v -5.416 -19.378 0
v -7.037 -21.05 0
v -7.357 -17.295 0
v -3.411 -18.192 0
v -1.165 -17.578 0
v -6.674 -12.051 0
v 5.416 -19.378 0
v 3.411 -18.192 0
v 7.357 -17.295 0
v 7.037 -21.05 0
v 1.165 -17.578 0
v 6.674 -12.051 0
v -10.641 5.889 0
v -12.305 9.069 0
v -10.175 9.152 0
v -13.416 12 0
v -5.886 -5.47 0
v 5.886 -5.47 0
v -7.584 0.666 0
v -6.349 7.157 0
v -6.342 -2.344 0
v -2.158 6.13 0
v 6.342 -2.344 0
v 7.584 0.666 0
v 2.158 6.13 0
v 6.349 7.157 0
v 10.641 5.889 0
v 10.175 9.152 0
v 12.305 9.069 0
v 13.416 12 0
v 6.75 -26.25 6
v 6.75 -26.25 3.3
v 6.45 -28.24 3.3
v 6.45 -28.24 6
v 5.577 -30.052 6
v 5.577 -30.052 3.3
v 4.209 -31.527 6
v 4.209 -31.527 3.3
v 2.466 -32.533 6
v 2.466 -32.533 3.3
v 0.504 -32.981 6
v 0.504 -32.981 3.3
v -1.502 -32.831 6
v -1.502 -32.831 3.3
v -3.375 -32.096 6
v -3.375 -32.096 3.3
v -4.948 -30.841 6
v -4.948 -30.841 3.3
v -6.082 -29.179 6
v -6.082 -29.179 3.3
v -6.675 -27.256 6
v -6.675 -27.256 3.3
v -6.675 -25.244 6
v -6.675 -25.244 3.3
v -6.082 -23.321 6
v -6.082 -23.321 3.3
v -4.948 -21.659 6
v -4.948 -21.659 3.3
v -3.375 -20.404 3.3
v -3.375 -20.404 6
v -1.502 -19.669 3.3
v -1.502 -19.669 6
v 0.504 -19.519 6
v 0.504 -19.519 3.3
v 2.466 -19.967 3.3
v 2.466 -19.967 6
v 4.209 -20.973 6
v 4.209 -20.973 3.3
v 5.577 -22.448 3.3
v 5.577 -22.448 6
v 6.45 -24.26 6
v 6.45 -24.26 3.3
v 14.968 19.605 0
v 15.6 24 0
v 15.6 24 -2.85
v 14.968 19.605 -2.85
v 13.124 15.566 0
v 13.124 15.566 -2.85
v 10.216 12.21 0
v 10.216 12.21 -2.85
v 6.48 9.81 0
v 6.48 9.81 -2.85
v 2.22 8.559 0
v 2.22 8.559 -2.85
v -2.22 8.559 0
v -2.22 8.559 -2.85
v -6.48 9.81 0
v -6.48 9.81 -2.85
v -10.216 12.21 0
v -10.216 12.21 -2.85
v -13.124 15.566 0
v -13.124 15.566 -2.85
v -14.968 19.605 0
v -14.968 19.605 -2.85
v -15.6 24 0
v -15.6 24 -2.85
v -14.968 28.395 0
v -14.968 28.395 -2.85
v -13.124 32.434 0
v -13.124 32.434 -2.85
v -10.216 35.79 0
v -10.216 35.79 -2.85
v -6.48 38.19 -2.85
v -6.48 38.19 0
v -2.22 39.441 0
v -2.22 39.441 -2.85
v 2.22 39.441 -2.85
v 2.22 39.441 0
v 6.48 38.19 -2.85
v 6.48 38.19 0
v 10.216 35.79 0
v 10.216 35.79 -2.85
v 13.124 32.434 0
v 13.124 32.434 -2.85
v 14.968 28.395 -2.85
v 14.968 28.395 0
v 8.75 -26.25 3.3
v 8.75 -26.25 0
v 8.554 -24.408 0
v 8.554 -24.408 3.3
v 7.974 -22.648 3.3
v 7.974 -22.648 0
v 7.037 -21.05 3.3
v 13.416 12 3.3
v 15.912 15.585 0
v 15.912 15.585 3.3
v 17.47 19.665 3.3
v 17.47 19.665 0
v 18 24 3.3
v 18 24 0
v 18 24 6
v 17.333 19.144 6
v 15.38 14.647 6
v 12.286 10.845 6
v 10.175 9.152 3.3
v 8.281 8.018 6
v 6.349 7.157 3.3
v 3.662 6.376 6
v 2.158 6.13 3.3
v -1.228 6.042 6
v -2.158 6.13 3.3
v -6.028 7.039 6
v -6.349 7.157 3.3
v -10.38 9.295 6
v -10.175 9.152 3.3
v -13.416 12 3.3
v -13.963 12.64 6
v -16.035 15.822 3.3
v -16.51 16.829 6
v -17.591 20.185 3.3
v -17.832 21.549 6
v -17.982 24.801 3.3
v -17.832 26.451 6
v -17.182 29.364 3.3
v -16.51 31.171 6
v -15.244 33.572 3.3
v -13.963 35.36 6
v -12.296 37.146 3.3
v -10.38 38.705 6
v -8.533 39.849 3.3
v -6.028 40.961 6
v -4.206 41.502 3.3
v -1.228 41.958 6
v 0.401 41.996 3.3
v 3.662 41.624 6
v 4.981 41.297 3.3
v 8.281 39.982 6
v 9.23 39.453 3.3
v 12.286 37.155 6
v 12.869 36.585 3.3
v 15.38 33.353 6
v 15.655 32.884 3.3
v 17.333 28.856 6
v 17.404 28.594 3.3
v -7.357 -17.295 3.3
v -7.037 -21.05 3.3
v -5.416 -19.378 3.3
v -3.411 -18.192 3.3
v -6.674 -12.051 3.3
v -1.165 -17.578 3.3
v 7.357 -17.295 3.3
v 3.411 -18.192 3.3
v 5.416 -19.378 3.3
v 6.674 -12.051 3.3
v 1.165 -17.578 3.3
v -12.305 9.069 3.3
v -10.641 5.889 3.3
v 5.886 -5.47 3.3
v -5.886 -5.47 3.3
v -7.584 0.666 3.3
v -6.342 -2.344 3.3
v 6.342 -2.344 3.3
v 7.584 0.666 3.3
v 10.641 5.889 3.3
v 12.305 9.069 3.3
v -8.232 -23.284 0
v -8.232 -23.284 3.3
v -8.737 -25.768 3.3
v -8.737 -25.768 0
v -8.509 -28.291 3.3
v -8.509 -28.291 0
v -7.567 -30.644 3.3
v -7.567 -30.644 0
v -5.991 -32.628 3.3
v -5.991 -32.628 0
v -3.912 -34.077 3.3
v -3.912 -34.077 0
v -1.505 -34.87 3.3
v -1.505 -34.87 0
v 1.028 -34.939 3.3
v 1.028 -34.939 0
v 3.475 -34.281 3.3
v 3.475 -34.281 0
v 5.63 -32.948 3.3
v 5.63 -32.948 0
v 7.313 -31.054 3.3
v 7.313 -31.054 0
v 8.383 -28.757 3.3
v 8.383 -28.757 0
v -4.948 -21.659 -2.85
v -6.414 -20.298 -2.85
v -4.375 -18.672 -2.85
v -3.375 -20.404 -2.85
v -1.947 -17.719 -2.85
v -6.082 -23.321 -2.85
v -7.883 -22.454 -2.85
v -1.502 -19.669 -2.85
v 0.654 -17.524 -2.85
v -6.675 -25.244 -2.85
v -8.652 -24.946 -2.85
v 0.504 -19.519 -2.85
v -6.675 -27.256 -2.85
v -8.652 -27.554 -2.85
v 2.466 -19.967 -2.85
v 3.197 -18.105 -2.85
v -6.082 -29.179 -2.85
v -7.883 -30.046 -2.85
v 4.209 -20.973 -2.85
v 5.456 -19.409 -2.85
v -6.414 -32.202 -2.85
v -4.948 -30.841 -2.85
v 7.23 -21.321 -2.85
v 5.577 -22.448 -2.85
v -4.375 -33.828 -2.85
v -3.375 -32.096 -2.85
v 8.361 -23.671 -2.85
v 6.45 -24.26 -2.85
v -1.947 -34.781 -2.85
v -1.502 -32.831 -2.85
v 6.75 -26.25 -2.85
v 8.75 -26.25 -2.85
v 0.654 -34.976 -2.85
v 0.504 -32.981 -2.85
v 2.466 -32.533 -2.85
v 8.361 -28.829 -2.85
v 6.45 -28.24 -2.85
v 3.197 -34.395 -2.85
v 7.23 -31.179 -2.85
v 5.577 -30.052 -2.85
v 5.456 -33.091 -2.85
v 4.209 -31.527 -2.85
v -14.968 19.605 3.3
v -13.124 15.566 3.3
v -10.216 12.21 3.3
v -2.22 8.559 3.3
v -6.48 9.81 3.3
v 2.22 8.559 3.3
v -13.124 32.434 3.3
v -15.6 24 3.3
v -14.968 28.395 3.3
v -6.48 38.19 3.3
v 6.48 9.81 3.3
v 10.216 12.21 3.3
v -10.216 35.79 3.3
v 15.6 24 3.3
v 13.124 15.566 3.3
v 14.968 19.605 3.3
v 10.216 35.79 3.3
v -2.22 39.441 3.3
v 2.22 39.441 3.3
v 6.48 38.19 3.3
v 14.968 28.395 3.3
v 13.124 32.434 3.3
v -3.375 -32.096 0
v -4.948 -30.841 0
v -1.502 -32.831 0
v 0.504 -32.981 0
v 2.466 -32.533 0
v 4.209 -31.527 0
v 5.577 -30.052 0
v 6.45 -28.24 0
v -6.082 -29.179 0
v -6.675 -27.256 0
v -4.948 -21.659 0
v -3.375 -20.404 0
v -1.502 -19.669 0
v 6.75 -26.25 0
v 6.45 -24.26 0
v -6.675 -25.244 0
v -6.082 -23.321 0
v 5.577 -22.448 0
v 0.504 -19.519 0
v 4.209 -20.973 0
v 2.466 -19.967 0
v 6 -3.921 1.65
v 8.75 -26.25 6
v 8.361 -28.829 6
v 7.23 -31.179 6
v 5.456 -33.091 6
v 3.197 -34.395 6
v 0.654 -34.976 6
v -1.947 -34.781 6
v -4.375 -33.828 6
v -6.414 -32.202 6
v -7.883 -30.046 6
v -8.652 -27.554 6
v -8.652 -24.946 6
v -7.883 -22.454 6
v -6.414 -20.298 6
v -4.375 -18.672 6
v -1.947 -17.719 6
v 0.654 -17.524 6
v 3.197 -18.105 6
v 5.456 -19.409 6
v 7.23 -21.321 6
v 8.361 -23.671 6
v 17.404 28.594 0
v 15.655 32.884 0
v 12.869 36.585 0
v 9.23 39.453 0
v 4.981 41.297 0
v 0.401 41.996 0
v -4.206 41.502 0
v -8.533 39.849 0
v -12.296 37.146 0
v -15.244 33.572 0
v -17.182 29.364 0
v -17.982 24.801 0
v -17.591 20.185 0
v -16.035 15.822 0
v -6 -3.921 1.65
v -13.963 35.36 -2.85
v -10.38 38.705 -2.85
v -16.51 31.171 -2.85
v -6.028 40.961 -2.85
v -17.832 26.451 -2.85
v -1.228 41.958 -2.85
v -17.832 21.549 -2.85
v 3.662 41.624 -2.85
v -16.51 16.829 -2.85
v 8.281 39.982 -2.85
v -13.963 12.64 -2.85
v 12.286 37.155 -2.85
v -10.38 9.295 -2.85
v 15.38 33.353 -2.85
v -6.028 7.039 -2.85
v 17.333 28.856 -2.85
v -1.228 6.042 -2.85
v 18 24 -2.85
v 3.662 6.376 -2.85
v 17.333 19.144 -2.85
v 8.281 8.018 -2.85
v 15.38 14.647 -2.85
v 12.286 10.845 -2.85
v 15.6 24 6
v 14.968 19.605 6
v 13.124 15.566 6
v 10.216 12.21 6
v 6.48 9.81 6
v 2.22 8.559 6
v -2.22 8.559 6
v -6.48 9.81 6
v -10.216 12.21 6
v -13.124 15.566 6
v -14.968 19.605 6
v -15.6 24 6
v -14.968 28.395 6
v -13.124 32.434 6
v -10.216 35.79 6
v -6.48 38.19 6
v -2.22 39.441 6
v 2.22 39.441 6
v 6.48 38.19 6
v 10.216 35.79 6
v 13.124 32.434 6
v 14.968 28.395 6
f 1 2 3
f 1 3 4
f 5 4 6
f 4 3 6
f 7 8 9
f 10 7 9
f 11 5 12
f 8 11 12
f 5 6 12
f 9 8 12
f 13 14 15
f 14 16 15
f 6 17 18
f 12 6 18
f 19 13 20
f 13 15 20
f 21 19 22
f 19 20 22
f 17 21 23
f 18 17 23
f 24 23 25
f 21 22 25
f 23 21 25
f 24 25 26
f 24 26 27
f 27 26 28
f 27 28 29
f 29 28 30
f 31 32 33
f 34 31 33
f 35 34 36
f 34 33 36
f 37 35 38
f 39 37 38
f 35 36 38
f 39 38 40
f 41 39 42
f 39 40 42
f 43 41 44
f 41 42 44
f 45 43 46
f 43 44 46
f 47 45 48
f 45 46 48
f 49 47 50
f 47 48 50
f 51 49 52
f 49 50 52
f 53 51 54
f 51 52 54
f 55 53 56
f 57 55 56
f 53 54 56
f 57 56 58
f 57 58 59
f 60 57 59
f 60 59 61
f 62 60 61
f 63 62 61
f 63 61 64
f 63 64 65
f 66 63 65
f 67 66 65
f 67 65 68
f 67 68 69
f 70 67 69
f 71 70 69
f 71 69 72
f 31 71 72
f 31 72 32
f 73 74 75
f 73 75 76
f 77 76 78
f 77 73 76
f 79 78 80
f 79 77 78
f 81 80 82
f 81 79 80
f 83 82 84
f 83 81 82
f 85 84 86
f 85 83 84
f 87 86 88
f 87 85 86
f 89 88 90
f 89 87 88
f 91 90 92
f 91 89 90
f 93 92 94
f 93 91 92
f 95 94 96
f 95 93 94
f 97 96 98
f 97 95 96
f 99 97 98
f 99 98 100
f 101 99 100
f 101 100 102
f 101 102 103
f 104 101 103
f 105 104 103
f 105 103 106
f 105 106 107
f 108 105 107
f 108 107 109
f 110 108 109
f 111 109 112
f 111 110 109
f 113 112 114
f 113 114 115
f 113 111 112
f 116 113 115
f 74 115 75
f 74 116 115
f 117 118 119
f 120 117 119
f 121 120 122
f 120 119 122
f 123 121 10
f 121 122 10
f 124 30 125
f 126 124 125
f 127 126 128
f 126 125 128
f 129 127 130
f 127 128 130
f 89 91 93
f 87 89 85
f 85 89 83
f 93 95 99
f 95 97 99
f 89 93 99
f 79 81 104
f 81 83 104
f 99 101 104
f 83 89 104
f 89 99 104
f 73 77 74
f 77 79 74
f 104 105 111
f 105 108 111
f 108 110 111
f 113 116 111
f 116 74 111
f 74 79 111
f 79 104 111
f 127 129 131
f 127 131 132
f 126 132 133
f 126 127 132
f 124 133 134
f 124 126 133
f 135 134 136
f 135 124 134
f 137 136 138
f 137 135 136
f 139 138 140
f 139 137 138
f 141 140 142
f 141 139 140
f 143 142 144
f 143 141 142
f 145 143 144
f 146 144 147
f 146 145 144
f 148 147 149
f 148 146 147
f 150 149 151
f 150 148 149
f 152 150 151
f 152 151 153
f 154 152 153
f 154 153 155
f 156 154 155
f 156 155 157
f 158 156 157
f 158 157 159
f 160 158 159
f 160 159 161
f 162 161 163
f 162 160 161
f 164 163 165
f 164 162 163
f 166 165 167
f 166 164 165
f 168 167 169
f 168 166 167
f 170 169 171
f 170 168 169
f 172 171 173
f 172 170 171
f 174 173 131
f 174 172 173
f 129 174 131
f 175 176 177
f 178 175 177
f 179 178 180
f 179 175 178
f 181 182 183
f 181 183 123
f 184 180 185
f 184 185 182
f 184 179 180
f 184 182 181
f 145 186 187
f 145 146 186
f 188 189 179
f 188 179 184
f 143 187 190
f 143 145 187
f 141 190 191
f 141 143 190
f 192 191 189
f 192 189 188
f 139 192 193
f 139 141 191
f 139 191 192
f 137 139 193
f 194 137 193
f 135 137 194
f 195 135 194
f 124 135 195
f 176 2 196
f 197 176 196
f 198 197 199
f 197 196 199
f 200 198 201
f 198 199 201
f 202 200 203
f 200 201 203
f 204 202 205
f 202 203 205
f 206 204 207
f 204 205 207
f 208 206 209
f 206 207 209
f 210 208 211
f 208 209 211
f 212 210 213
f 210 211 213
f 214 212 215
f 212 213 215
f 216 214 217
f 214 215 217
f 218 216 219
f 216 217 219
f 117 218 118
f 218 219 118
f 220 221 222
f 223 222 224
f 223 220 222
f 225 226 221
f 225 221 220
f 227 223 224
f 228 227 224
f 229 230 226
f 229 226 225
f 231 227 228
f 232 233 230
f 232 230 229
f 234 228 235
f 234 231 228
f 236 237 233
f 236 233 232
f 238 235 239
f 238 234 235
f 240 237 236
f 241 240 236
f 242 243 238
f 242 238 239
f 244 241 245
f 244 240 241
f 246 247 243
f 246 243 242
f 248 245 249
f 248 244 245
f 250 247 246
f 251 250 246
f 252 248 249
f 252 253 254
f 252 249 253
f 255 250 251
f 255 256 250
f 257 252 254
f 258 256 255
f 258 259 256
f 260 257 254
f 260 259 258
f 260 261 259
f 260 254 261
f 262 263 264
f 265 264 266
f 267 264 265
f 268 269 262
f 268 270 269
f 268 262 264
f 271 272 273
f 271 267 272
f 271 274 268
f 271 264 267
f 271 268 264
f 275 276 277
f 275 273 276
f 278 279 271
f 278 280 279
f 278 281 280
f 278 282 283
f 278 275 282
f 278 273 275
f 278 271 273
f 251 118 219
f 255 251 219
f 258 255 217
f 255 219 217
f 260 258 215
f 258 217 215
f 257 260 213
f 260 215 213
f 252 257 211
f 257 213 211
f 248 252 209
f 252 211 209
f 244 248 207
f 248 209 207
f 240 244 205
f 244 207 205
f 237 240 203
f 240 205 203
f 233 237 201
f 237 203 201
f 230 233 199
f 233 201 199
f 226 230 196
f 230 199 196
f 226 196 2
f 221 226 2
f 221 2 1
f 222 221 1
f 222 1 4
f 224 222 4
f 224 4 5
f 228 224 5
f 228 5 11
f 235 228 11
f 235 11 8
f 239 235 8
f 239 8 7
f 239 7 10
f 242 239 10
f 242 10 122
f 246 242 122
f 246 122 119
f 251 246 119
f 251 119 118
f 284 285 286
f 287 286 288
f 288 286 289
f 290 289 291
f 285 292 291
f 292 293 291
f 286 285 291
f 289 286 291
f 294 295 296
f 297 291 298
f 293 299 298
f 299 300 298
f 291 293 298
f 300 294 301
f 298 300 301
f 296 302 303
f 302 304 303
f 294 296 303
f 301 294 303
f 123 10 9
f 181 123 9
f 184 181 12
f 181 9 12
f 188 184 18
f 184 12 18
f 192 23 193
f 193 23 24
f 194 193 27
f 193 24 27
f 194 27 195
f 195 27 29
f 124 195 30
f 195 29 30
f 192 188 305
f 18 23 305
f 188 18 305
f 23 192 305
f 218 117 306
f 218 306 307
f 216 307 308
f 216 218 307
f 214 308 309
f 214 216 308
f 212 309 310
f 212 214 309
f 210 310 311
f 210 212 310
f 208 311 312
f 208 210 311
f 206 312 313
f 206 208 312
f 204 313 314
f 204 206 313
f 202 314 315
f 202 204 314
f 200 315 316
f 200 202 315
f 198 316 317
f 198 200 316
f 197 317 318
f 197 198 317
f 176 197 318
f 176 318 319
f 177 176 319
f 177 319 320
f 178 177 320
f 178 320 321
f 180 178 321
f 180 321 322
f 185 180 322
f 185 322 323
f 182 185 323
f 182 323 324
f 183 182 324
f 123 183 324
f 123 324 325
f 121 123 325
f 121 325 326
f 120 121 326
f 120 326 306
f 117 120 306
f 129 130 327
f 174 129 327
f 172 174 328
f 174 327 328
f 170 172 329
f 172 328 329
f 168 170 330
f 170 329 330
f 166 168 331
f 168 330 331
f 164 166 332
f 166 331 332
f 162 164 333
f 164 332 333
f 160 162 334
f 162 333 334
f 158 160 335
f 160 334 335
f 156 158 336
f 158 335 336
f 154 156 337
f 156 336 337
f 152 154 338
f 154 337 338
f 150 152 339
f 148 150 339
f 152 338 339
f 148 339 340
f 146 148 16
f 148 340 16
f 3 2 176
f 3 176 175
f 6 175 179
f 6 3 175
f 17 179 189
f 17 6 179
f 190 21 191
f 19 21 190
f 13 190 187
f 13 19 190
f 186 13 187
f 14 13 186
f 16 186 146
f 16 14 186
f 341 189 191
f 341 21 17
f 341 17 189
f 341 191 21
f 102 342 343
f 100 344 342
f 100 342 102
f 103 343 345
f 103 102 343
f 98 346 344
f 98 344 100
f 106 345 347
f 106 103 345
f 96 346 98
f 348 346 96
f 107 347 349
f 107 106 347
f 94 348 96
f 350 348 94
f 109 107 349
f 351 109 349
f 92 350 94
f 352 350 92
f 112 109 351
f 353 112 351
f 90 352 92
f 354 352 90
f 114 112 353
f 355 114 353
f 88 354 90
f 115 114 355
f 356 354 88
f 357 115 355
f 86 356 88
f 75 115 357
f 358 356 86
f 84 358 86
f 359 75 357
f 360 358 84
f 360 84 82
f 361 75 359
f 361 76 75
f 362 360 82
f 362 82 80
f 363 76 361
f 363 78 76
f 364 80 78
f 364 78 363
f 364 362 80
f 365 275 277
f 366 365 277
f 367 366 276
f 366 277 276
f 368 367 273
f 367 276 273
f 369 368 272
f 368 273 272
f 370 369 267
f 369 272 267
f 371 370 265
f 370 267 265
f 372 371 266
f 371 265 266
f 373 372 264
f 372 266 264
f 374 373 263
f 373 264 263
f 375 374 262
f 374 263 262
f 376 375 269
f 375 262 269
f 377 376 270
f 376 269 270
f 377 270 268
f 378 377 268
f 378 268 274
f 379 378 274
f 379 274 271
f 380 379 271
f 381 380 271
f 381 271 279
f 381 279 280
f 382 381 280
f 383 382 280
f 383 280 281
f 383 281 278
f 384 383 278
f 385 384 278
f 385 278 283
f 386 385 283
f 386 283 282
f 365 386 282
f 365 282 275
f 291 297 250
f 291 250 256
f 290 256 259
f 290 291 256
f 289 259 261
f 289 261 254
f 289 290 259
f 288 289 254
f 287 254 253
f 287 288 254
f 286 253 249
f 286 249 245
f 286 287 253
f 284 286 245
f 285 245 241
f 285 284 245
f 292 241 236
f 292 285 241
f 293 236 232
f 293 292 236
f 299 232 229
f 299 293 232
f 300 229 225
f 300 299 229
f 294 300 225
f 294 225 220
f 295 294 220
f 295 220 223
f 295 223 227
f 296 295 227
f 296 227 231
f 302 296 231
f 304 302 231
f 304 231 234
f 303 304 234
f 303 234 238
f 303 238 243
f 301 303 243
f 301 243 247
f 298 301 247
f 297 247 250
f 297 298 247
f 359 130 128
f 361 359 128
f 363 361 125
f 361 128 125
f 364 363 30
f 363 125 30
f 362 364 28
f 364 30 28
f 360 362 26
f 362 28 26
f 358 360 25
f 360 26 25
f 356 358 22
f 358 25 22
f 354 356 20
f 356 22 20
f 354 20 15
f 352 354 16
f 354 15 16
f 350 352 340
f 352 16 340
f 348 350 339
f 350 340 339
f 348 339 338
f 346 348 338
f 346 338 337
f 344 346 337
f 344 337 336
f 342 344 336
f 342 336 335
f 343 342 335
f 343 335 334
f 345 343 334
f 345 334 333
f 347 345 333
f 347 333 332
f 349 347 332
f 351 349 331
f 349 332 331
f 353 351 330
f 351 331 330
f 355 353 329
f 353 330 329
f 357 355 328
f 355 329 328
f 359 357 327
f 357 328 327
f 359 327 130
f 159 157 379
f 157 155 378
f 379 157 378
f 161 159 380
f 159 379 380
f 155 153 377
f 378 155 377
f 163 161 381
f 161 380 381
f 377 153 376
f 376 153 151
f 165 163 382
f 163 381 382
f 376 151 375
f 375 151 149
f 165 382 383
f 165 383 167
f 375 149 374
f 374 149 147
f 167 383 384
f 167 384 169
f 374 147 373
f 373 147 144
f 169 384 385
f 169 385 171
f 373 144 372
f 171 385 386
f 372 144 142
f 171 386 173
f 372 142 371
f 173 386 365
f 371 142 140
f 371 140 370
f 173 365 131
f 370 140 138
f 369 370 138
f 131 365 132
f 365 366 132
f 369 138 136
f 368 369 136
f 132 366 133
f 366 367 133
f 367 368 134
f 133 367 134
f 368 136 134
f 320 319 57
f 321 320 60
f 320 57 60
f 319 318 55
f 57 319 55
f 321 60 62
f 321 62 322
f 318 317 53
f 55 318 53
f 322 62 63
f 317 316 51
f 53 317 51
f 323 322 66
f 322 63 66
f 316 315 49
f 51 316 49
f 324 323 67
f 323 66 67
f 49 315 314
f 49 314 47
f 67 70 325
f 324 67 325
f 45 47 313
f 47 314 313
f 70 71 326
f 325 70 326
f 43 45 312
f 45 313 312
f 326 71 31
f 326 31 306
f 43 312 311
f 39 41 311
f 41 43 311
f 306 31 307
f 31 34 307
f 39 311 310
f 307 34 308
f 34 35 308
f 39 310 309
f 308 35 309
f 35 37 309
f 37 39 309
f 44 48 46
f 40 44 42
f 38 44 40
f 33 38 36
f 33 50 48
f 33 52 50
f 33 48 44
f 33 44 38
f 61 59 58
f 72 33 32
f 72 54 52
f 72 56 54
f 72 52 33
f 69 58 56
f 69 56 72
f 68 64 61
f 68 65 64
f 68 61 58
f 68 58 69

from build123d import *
from build123d import SkipClean  # not in build123d's __all__

# Parameters (mm, degrees)
F1_DEPTH      = 3.3
F2_R          = 18
F2_R_2        = 15.6
F2_R_3        = 8.75
F2_R_4        = 6.75
F3_DEPTH      = 2.85
F3_DEPTH_BACK = 6


with BuildPart() as f1:
    # F0 (on Top) → F1 (new body)
    with BuildSketch(Plane.XY):
        with BuildLine():
            add(Edge.make_bspline(
                [(7.0372224634, -21.05), (8.3671803407, -15.6501668156), (2.1195257428, -2.6023508459), (11.4288521337, 5.4147908541), (13.416407865, 12)],
                knots=[0, 0, 0, 0, 0.4970922674, 1, 1, 1, 1], degree=3))
            ThreePointArc((13.416407865, 12), (0, 42), (-13.416407865, 12))
            add(Edge.make_bspline(
                [(-7.0372224634, -21.05), (-8.3671803407, -15.6501668156), (-2.1195257428, -2.6023508459), (-11.4288521337, 5.4147908541), (-13.416407865, 12)],
                knots=[0, 0, 0, 0, 0.4970922674, 1, 1, 1, 1], degree=3))
            ThreePointArc((-7.0372224634, -21.05), (0, -35), (7.0372224634, -21.05))
        make_face()
    extrude(amount=F1_DEPTH)

    # F2 (on face) → F3 (join, two sides)
    with BuildSketch(Plane(origin=(0, 0, 0), x_dir=(1, 0, 0), z_dir=(0, 0, -1))) as f3_sk:
        with Locations((0, -24)):
            Circle(F2_R)
        with Locations((0, -24)):
            Circle(F2_R_2, mode=Mode.SUBTRACT)
        with Locations((0, 26.25)):
            Circle(F2_R_3)
        with Locations((0, 26.25)):
            Circle(F2_R_4, mode=Mode.SUBTRACT)
    with SkipClean():  # cleaning this boolean's faces spoils the solid; the shape is the same uncleaned
        extrude(amount=F3_DEPTH)
        extrude(f3_sk.sketch, amount=-F3_DEPTH_BACK)


solid = f1.part
